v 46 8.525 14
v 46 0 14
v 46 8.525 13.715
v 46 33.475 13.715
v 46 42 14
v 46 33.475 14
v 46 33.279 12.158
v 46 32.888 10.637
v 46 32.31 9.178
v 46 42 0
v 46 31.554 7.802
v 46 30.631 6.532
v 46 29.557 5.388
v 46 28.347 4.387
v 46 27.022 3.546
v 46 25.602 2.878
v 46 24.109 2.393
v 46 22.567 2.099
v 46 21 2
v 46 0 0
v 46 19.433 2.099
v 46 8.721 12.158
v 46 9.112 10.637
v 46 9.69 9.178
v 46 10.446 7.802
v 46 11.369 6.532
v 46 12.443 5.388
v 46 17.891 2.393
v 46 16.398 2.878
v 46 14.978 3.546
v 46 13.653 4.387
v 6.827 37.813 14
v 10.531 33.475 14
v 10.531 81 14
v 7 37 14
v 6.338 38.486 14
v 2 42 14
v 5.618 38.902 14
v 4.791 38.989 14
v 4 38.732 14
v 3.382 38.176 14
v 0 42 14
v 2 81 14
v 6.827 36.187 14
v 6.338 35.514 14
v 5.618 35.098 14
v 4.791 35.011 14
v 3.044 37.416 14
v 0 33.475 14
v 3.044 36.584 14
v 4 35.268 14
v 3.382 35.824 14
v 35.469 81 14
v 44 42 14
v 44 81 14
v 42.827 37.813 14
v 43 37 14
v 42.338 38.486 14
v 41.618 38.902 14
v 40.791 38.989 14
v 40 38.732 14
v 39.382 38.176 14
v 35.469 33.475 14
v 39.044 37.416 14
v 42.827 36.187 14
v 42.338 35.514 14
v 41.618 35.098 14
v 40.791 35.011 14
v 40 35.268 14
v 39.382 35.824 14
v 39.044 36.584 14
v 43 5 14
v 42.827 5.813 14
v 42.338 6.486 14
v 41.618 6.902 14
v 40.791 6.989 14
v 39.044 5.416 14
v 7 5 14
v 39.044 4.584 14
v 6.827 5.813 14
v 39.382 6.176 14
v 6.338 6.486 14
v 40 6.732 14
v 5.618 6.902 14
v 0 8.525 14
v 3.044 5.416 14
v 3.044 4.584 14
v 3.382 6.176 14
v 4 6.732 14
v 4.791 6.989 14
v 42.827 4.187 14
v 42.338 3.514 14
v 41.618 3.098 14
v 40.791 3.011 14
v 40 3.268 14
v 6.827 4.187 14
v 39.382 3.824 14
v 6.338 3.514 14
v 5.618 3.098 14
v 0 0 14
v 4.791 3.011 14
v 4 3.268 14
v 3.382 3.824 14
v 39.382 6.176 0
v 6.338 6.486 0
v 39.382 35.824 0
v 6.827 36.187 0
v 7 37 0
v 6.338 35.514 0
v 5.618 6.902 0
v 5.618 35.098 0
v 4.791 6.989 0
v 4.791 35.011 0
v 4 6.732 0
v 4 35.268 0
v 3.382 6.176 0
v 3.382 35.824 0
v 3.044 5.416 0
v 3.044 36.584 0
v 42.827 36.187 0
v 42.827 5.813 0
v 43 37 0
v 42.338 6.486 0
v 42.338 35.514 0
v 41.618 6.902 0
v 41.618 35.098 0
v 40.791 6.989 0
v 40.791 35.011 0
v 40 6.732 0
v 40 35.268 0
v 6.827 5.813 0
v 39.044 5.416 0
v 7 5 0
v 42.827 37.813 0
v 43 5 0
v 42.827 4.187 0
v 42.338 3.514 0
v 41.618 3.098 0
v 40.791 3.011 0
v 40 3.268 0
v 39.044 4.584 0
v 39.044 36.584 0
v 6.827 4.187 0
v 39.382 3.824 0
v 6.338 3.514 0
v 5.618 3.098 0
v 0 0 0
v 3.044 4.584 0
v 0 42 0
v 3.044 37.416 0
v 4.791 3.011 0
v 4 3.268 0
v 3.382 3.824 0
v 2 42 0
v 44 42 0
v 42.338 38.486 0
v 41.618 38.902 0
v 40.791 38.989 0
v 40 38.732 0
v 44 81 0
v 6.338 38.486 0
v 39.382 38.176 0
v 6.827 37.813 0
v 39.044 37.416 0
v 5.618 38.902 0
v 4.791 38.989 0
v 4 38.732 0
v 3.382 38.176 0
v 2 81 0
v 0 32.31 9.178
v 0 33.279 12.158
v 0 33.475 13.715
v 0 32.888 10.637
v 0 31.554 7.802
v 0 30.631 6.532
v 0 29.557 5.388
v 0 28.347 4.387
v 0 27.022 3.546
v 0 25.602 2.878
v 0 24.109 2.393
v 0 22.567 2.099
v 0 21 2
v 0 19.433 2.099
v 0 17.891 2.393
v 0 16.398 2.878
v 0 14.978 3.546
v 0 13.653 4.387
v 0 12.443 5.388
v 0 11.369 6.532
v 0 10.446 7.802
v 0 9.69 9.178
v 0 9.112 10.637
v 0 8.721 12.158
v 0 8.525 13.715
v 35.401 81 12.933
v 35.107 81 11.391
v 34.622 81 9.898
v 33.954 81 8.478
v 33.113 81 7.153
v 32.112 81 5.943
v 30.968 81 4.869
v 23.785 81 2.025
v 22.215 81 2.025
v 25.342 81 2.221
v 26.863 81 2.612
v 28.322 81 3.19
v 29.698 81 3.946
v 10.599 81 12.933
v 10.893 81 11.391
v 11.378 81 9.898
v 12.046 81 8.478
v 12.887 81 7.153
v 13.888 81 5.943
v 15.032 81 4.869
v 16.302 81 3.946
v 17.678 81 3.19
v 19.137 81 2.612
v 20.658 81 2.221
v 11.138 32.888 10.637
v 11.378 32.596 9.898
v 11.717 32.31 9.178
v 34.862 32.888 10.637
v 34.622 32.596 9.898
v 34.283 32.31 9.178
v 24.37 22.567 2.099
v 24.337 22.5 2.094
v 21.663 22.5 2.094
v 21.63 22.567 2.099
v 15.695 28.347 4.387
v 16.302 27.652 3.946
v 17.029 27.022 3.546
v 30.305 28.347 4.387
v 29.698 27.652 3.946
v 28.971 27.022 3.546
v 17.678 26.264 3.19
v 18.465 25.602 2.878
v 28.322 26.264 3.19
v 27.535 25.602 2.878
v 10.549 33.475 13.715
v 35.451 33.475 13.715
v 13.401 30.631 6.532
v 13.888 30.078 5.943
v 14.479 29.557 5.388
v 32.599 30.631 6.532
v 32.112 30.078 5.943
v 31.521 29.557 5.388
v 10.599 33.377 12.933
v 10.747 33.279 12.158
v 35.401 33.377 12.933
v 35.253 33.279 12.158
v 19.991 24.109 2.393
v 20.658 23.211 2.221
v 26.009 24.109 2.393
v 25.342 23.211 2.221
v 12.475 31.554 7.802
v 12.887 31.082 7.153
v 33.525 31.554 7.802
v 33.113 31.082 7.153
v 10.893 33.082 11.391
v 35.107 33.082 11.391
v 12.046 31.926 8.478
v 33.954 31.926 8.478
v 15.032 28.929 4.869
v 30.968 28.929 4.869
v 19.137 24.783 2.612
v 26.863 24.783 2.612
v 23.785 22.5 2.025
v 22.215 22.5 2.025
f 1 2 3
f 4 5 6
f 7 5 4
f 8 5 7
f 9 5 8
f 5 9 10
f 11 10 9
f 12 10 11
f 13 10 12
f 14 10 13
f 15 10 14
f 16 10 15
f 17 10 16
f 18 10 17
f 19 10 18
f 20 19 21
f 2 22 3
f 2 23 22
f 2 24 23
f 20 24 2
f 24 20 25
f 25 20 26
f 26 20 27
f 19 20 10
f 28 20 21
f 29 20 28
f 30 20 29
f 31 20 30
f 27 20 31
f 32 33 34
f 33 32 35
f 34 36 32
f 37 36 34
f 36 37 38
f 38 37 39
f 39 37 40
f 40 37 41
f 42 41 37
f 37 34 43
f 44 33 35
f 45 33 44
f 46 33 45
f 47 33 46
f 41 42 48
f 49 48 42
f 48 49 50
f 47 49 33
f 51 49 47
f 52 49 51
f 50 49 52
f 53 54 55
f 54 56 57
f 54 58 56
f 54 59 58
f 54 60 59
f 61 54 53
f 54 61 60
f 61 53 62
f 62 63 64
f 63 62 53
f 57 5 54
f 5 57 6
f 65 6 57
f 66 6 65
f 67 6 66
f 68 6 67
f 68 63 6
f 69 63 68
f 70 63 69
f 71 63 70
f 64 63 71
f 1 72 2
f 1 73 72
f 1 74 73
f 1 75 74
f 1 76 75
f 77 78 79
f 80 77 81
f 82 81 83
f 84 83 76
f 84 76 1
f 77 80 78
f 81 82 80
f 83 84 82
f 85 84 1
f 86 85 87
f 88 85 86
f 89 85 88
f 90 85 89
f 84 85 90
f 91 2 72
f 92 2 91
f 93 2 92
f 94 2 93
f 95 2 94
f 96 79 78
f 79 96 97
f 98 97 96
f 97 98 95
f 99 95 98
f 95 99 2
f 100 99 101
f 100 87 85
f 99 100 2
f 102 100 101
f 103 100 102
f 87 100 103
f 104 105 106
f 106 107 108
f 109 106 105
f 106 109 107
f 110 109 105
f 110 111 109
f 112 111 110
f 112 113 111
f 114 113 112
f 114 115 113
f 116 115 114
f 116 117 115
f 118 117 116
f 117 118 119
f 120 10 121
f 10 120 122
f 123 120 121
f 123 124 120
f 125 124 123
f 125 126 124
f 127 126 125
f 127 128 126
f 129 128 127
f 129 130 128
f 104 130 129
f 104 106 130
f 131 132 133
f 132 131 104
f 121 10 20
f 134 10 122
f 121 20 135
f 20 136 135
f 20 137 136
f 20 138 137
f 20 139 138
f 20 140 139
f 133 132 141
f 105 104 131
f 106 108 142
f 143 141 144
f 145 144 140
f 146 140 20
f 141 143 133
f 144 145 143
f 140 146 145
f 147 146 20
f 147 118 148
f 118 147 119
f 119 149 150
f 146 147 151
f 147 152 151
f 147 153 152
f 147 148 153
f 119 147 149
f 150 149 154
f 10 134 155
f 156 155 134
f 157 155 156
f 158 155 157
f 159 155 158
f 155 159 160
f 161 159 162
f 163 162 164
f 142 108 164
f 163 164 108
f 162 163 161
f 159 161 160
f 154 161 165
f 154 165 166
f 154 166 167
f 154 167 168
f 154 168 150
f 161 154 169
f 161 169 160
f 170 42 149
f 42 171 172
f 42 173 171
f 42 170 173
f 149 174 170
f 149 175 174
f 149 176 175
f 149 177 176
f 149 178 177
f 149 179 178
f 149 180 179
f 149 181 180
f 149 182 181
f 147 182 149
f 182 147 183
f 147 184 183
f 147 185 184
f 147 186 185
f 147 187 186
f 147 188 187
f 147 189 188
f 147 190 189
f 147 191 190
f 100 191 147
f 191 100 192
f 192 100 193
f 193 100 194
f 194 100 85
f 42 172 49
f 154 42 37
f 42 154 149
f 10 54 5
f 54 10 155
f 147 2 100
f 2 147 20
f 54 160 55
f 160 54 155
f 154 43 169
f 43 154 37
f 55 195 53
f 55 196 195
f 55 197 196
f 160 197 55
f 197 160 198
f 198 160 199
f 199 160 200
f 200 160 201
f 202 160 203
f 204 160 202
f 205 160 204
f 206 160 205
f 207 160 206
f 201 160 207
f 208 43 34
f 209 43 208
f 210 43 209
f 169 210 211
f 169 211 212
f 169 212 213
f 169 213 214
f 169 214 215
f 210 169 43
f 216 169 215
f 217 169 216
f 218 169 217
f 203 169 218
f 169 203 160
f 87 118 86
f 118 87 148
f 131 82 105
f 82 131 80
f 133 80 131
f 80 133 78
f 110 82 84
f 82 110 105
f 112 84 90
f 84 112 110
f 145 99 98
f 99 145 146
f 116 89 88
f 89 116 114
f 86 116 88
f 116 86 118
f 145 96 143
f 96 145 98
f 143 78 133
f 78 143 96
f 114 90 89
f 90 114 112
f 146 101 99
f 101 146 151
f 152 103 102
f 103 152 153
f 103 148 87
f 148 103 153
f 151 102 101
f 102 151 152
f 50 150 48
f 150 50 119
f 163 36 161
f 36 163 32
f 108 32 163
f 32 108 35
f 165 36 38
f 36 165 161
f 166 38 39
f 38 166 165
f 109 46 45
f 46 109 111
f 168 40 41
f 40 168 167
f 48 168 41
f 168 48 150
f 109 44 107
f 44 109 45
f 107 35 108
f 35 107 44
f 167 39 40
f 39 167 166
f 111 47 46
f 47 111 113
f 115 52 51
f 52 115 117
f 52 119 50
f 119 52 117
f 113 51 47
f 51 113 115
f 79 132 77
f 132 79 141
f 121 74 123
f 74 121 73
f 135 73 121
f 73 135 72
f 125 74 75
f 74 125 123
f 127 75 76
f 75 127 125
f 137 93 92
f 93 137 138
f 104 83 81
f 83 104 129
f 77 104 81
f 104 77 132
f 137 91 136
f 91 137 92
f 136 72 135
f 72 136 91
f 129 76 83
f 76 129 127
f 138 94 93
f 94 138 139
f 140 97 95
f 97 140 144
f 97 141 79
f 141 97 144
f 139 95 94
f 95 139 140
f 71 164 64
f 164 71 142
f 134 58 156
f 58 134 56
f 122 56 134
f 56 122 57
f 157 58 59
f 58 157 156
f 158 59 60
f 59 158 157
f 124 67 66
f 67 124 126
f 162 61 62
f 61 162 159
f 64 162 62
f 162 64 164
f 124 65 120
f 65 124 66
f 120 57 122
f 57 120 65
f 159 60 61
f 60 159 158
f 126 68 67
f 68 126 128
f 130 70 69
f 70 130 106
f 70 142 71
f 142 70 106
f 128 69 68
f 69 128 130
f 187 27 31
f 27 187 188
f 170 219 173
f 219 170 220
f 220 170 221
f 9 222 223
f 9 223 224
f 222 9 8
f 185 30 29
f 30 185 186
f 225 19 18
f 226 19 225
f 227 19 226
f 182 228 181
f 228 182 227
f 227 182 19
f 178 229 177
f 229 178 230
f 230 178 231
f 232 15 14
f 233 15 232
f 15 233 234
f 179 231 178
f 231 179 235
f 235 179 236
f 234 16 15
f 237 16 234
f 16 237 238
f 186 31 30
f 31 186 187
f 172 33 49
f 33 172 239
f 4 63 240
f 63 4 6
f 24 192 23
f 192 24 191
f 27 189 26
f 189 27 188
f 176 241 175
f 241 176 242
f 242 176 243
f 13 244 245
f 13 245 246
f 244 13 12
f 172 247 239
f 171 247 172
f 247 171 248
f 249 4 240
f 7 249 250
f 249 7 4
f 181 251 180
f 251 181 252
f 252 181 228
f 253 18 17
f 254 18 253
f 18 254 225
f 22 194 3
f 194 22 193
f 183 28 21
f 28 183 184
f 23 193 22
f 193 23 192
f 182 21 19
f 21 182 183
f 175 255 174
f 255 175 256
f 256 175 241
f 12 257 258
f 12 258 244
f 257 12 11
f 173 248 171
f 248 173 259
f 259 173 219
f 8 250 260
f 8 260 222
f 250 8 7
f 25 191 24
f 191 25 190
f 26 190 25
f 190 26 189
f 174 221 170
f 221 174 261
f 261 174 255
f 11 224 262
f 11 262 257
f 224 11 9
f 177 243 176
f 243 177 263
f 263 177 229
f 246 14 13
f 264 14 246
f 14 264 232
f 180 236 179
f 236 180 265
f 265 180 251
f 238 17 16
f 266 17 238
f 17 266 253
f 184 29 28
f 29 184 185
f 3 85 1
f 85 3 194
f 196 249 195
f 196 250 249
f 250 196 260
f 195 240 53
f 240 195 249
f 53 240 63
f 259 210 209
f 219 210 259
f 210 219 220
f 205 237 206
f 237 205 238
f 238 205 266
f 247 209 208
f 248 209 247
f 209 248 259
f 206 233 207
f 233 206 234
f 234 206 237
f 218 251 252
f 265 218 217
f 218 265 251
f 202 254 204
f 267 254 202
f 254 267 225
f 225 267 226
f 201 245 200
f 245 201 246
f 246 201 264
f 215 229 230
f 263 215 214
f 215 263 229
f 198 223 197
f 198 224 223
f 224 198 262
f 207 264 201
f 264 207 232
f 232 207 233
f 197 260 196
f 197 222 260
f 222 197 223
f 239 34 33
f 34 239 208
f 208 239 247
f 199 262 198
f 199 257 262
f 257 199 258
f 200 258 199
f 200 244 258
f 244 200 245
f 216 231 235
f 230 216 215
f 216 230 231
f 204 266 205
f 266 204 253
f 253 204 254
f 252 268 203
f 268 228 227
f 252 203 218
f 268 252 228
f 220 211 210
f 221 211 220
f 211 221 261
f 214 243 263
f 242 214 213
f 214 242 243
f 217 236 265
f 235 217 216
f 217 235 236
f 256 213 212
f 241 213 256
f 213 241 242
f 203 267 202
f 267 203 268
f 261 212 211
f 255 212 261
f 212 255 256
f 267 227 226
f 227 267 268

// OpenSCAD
// file: material_colors.scad
// Author: Mihai Oltean, https://mihaioltean.github.io, mihai.oltean@gmail.com
// More details: https://jenny5.org, https://jenny5-robot.github.io/
// Source code: github.com/jenny5-robot
// MIT License
//--------------------------------------------------------------

aluminium_color = "Silver";
screw_color = "LightSlateGray";
frame_color = aluminium_color;
shaft_color = "Silver";
plastic_color = "Yellow";
pulley_color = "DarkSlateGray";
steel_color = "LightSlateGray";
wood_color = "Maroon";
// file: params_basic_components.scad
// Author: Mihai Oltean, https://mihaioltean.github.io, mihai.oltean@gmail.com
// More details: https://jenny5.org, https://jenny5-robot.github.io/
// Source code: github.com/jenny5-robot
// MIT License
//--------------------------------------------------------------

spring_length = 20;

smooth_rod_8_radius = 4;
smooth_rod_10_radius = 5;
smooth_rod_12_radius = 6;

wall_thick_1 = 1;
wall_thick_2 = 2;
wall_thick_3 = 3;
wall_thick_4 = 4;
wall_thick_5 = 5;
wall_thick_5_5 = 5.5;
wall_thick_6 = 6;
wall_thick_7 = 7;
wall_thick_8 = 8;
wall_thick_9 = 9;
wall_thick_10 = 10;
wall_thick_12 = 12;
// file: params_screws_nuts_washers.scad
// Author: Mihai Oltean, https://mihaioltean.github.io, mihai.oltean@gmail.com
// More details: https://jenny5.org, https://jenny5-robot.github.io/
// Source code: github.com/jenny5-robot
// MIT License
//--------------------------------------------------------------


m2_screw_radius = 1;
m2_nut_radius = 2.2;
m2_nut_height = 1.6;
m2_nut_thick = m2_nut_height;

m3_screw_radius = 1.5;
m3_nut_radius = 3.1;
m3_nut_height = 2.3;
m3_nut_thick = m3_nut_height;
m3_autolock_nut_thick = 4.2;

m4_screw_radius = 2;
m4_nut_radius = 4;
m4_auto_lock_nut_height = 5;
m4_nut_height = 3.25;
m4_nut_thick = 3.25;

m5_screw_radius = 2.5;
m5_nut_radius = 4.6;
m5_nut_height = 4;

m6_screw_radius = 3;
m6_nut_radius = 5.65;
m6_nut_thick = 5;
m6_nut_slim_thick = 3;
m6_autolock_nut_thick = 6;
m6_long_nut_thick = 9;

M8_screw_head_height = 5.7;
M8_screw_radius = 3.9;
M8_nut_small_width = 12.8;
M8_nut_radius = 7.3;
M8_slim_nut_small_width = 12.4;
M8_nut_thick = 6.5;
M8_nut_height = M8_nut_thick;
M8_slim_nut_height = 5.5;
M8_screw_head_radius = 6.5;
M8_autolock_nut_thick = 8;

M10_screw_radius = 5;
M10_nut_thick = 8;
M10_nut_radius = 9.8;

M12_screw_radius = 6;
M12_nut_thick = 10;
M12_nut_radius = 11;
M12_long_long_nut_thick = 36;
M12_long_nut_thick = 36;
M12_autolock_nut_thick = 14;

M10_long_nut_radius = 9.71;
M10_long_nut_height = 29.8;

M10_long_thick_nut_radius = 7.41;
M10_long_thick_nut_height = 30.4;

M12_plastic_nut_radius = 10.45;
M12_plastic_nut_height = 23.3;

tr12_3_nut_radius = 11;
tr12_3_nut_height = 18.1;

washer_5 = 0.97;

washer_4_12_radius = 6;
washer_4_12_external_radius = 6;
washer_4_12_thick = 1;
washer_4_thick = 1;
washer_4_12_internal_radius = 2.15;

washer_4_9_external_radius = 4.5;
washer_4_9_internal_radius = 2.15;
washer_4_9_thick = 1;

washer_6_thick = 1.7;
washer_8_thick = 1.5;

washer_10_height = 2;
washer_10_thick = 2;

washer_12_thick = 2;

washer_5_15_external_radius = 7.5;
washer_5_15_thick = 1;
washer_5_thick = 1;
washer_5_15_internal_radius = 2.65;
// file: tolerance.scad
// Author: Mihai Oltean, https://mihaioltean.github.io, mihai.oltean@gmail.com
// More details: https://jenny5.org, https://jenny5-robot.github.io/
// Source code: github.com/jenny5-robot
// MIT License
//--------------------------------------------------------------

tolerance = 0.1;
display_tolerance = 1;

overlap_tolerance = 0.01;

tolerance_z = [0, 0, tolerance];
tolerance_x = [tolerance, 0, 0];
tolerance_y = [0, tolerance, 0];

display_tolerance_z = [0, 0, display_tolerance];
display_tolerance_x = [display_tolerance, 0, 0];
display_tolerance_y = [0, display_tolerance, 0];

display_tolerance_xz = [display_tolerance, 0, display_tolerance];
display_tolerance_xy = [display_tolerance, display_tolerance, 0];
display_tolerance_yz = [0, display_tolerance, display_tolerance];

display_tolerance_xyz = [display_tolerance, display_tolerance, display_tolerance];
// file: params_corners.scad
// Author: Mihai Oltean, https://mihaioltean.github.io, mihai.oltean@gmail.com
// More details: https://jenny5.org, https://jenny5-robot.github.io/
// Source code: github.com/jenny5-robot
// MIT License
//--------------------------------------------------------------

include <params_screws_nuts_washers.scad>
include <params_basic_components.scad>
include <material_colors.scad>


corner_length = 46;

corner_base_thick = wall_thick_2;

corner_lateral_wall_thick = 2 * m4_screw_radius + wall_thick_3 + 1.5;

function f_corner_width(tube_radius) = 2 * (tube_radius + corner_lateral_wall_thick);
function f_corner_height(tube_radius) = corner_base_thick + tube_radius - 0.5;

corner_sheet_size = [corner_length, 90, wall_thick_3];

function f_corner_holes(tube_radius) = [
    [5, 5, 0],
    [5, f_corner_width(12.5) - (wall_thick_3 + m4_screw_radius), 0],
    [corner_length - 5, wall_thick_3 + m4_screw_radius, 0],
    [corner_length - 5, f_corner_width(12.5) - (wall_thick_3 + m4_screw_radius), 0],
    [7, corner_sheet_size[1] - 5, 0],
    [corner_length - 7, corner_sheet_size[1] - 5, 0],
    [7, corner_sheet_size[1] - 42, 0],
    [corner_length - 7, corner_sheet_size[1] - 42, 0]
];

corner_holes = f_corner_holes(12.5);



//echo(corner_sheet_size=corner_sheet_size);

//echo(corner_holes=corner_holes);
// main file
// Author: Mihai Oltean, https://mihaioltean.github.io, mihai.oltean@gmail.com
// More details: https://jenny5.org, https://jenny5-robot.github.io/
// Source code: github.com/jenny5-robot
// MIT License
//--------------------------------------------------------------

include <params_corners.scad>
include <tolerance.scad>

//-------------------------------------------------------------------------
module corner_half_T(tube_radius)
{
    corner_width = f_corner_width(tube_radius);
    corner_height = f_corner_height(tube_radius);

    difference(){
        union(){
            color(plastic_color) cube([corner_length, corner_width, corner_height]);
            translate ([-corner_width / 2 + corner_length / 2, corner_width - (wall_thick_3 + 2 * m4_screw_radius), 0]) color(plastic_color)cube([corner_width, corner_length, corner_height]);
        }
        // tube horizontal
        translate ([0, corner_width / 2, corner_base_thick + tube_radius] - display_tolerance_x) rotate([0, 90, 0]) cylinder(h = corner_length + 2 * display_tolerance, r = tube_radius, $fn = 50);
    // tube vertical
        translate ([corner_length / 2, corner_width - (wall_thick_3 + 2 * m4_screw_radius) - tube_radius, corner_base_thick + tube_radius]) rotate([-90, 0, 0]) cylinder(h = corner_length + display_tolerance + tube_radius, r = tube_radius, $fn = 50);
    
        for (i = [0 : 5])
            translate(corner_holes[i] - display_tolerance_z) cylinder (h = corner_height + 2 * display_tolerance, r = m4_screw_radius, $fn = 15);
    }
}

//-------------------------------------------------------------------------
module tube_corner(tube_radius)
{
    corner_height = f_corner_height(tube_radius);
    corner_width = f_corner_width(tube_radius);
    
    translate ([-corner_length / 2, -corner_width / 2, - corner_sheet_size[2] - corner_base_thick - tube_radius]){
        corner_sheet(tube_radius);
        translate ([0, 0, corner_sheet_size[2]]) corner_half_T(tube_radius);
        translate ([0, 0, 2 * tube_radius + 2 * corner_base_thick + corner_sheet_size[2]]) mirror([0, 0, 1]) corner_half_T(tube_radius);  
        translate ([0, 0, 2 * tube_radius + 2 * corner_base_thick + corner_sheet_size[2]]) corner_sheet(tube_radius);
    }
}
//-------------------------------------------------------------------------

//tube_corner(12.5);
//corner_sheet(12.5);
corner_half_T(12.5);
